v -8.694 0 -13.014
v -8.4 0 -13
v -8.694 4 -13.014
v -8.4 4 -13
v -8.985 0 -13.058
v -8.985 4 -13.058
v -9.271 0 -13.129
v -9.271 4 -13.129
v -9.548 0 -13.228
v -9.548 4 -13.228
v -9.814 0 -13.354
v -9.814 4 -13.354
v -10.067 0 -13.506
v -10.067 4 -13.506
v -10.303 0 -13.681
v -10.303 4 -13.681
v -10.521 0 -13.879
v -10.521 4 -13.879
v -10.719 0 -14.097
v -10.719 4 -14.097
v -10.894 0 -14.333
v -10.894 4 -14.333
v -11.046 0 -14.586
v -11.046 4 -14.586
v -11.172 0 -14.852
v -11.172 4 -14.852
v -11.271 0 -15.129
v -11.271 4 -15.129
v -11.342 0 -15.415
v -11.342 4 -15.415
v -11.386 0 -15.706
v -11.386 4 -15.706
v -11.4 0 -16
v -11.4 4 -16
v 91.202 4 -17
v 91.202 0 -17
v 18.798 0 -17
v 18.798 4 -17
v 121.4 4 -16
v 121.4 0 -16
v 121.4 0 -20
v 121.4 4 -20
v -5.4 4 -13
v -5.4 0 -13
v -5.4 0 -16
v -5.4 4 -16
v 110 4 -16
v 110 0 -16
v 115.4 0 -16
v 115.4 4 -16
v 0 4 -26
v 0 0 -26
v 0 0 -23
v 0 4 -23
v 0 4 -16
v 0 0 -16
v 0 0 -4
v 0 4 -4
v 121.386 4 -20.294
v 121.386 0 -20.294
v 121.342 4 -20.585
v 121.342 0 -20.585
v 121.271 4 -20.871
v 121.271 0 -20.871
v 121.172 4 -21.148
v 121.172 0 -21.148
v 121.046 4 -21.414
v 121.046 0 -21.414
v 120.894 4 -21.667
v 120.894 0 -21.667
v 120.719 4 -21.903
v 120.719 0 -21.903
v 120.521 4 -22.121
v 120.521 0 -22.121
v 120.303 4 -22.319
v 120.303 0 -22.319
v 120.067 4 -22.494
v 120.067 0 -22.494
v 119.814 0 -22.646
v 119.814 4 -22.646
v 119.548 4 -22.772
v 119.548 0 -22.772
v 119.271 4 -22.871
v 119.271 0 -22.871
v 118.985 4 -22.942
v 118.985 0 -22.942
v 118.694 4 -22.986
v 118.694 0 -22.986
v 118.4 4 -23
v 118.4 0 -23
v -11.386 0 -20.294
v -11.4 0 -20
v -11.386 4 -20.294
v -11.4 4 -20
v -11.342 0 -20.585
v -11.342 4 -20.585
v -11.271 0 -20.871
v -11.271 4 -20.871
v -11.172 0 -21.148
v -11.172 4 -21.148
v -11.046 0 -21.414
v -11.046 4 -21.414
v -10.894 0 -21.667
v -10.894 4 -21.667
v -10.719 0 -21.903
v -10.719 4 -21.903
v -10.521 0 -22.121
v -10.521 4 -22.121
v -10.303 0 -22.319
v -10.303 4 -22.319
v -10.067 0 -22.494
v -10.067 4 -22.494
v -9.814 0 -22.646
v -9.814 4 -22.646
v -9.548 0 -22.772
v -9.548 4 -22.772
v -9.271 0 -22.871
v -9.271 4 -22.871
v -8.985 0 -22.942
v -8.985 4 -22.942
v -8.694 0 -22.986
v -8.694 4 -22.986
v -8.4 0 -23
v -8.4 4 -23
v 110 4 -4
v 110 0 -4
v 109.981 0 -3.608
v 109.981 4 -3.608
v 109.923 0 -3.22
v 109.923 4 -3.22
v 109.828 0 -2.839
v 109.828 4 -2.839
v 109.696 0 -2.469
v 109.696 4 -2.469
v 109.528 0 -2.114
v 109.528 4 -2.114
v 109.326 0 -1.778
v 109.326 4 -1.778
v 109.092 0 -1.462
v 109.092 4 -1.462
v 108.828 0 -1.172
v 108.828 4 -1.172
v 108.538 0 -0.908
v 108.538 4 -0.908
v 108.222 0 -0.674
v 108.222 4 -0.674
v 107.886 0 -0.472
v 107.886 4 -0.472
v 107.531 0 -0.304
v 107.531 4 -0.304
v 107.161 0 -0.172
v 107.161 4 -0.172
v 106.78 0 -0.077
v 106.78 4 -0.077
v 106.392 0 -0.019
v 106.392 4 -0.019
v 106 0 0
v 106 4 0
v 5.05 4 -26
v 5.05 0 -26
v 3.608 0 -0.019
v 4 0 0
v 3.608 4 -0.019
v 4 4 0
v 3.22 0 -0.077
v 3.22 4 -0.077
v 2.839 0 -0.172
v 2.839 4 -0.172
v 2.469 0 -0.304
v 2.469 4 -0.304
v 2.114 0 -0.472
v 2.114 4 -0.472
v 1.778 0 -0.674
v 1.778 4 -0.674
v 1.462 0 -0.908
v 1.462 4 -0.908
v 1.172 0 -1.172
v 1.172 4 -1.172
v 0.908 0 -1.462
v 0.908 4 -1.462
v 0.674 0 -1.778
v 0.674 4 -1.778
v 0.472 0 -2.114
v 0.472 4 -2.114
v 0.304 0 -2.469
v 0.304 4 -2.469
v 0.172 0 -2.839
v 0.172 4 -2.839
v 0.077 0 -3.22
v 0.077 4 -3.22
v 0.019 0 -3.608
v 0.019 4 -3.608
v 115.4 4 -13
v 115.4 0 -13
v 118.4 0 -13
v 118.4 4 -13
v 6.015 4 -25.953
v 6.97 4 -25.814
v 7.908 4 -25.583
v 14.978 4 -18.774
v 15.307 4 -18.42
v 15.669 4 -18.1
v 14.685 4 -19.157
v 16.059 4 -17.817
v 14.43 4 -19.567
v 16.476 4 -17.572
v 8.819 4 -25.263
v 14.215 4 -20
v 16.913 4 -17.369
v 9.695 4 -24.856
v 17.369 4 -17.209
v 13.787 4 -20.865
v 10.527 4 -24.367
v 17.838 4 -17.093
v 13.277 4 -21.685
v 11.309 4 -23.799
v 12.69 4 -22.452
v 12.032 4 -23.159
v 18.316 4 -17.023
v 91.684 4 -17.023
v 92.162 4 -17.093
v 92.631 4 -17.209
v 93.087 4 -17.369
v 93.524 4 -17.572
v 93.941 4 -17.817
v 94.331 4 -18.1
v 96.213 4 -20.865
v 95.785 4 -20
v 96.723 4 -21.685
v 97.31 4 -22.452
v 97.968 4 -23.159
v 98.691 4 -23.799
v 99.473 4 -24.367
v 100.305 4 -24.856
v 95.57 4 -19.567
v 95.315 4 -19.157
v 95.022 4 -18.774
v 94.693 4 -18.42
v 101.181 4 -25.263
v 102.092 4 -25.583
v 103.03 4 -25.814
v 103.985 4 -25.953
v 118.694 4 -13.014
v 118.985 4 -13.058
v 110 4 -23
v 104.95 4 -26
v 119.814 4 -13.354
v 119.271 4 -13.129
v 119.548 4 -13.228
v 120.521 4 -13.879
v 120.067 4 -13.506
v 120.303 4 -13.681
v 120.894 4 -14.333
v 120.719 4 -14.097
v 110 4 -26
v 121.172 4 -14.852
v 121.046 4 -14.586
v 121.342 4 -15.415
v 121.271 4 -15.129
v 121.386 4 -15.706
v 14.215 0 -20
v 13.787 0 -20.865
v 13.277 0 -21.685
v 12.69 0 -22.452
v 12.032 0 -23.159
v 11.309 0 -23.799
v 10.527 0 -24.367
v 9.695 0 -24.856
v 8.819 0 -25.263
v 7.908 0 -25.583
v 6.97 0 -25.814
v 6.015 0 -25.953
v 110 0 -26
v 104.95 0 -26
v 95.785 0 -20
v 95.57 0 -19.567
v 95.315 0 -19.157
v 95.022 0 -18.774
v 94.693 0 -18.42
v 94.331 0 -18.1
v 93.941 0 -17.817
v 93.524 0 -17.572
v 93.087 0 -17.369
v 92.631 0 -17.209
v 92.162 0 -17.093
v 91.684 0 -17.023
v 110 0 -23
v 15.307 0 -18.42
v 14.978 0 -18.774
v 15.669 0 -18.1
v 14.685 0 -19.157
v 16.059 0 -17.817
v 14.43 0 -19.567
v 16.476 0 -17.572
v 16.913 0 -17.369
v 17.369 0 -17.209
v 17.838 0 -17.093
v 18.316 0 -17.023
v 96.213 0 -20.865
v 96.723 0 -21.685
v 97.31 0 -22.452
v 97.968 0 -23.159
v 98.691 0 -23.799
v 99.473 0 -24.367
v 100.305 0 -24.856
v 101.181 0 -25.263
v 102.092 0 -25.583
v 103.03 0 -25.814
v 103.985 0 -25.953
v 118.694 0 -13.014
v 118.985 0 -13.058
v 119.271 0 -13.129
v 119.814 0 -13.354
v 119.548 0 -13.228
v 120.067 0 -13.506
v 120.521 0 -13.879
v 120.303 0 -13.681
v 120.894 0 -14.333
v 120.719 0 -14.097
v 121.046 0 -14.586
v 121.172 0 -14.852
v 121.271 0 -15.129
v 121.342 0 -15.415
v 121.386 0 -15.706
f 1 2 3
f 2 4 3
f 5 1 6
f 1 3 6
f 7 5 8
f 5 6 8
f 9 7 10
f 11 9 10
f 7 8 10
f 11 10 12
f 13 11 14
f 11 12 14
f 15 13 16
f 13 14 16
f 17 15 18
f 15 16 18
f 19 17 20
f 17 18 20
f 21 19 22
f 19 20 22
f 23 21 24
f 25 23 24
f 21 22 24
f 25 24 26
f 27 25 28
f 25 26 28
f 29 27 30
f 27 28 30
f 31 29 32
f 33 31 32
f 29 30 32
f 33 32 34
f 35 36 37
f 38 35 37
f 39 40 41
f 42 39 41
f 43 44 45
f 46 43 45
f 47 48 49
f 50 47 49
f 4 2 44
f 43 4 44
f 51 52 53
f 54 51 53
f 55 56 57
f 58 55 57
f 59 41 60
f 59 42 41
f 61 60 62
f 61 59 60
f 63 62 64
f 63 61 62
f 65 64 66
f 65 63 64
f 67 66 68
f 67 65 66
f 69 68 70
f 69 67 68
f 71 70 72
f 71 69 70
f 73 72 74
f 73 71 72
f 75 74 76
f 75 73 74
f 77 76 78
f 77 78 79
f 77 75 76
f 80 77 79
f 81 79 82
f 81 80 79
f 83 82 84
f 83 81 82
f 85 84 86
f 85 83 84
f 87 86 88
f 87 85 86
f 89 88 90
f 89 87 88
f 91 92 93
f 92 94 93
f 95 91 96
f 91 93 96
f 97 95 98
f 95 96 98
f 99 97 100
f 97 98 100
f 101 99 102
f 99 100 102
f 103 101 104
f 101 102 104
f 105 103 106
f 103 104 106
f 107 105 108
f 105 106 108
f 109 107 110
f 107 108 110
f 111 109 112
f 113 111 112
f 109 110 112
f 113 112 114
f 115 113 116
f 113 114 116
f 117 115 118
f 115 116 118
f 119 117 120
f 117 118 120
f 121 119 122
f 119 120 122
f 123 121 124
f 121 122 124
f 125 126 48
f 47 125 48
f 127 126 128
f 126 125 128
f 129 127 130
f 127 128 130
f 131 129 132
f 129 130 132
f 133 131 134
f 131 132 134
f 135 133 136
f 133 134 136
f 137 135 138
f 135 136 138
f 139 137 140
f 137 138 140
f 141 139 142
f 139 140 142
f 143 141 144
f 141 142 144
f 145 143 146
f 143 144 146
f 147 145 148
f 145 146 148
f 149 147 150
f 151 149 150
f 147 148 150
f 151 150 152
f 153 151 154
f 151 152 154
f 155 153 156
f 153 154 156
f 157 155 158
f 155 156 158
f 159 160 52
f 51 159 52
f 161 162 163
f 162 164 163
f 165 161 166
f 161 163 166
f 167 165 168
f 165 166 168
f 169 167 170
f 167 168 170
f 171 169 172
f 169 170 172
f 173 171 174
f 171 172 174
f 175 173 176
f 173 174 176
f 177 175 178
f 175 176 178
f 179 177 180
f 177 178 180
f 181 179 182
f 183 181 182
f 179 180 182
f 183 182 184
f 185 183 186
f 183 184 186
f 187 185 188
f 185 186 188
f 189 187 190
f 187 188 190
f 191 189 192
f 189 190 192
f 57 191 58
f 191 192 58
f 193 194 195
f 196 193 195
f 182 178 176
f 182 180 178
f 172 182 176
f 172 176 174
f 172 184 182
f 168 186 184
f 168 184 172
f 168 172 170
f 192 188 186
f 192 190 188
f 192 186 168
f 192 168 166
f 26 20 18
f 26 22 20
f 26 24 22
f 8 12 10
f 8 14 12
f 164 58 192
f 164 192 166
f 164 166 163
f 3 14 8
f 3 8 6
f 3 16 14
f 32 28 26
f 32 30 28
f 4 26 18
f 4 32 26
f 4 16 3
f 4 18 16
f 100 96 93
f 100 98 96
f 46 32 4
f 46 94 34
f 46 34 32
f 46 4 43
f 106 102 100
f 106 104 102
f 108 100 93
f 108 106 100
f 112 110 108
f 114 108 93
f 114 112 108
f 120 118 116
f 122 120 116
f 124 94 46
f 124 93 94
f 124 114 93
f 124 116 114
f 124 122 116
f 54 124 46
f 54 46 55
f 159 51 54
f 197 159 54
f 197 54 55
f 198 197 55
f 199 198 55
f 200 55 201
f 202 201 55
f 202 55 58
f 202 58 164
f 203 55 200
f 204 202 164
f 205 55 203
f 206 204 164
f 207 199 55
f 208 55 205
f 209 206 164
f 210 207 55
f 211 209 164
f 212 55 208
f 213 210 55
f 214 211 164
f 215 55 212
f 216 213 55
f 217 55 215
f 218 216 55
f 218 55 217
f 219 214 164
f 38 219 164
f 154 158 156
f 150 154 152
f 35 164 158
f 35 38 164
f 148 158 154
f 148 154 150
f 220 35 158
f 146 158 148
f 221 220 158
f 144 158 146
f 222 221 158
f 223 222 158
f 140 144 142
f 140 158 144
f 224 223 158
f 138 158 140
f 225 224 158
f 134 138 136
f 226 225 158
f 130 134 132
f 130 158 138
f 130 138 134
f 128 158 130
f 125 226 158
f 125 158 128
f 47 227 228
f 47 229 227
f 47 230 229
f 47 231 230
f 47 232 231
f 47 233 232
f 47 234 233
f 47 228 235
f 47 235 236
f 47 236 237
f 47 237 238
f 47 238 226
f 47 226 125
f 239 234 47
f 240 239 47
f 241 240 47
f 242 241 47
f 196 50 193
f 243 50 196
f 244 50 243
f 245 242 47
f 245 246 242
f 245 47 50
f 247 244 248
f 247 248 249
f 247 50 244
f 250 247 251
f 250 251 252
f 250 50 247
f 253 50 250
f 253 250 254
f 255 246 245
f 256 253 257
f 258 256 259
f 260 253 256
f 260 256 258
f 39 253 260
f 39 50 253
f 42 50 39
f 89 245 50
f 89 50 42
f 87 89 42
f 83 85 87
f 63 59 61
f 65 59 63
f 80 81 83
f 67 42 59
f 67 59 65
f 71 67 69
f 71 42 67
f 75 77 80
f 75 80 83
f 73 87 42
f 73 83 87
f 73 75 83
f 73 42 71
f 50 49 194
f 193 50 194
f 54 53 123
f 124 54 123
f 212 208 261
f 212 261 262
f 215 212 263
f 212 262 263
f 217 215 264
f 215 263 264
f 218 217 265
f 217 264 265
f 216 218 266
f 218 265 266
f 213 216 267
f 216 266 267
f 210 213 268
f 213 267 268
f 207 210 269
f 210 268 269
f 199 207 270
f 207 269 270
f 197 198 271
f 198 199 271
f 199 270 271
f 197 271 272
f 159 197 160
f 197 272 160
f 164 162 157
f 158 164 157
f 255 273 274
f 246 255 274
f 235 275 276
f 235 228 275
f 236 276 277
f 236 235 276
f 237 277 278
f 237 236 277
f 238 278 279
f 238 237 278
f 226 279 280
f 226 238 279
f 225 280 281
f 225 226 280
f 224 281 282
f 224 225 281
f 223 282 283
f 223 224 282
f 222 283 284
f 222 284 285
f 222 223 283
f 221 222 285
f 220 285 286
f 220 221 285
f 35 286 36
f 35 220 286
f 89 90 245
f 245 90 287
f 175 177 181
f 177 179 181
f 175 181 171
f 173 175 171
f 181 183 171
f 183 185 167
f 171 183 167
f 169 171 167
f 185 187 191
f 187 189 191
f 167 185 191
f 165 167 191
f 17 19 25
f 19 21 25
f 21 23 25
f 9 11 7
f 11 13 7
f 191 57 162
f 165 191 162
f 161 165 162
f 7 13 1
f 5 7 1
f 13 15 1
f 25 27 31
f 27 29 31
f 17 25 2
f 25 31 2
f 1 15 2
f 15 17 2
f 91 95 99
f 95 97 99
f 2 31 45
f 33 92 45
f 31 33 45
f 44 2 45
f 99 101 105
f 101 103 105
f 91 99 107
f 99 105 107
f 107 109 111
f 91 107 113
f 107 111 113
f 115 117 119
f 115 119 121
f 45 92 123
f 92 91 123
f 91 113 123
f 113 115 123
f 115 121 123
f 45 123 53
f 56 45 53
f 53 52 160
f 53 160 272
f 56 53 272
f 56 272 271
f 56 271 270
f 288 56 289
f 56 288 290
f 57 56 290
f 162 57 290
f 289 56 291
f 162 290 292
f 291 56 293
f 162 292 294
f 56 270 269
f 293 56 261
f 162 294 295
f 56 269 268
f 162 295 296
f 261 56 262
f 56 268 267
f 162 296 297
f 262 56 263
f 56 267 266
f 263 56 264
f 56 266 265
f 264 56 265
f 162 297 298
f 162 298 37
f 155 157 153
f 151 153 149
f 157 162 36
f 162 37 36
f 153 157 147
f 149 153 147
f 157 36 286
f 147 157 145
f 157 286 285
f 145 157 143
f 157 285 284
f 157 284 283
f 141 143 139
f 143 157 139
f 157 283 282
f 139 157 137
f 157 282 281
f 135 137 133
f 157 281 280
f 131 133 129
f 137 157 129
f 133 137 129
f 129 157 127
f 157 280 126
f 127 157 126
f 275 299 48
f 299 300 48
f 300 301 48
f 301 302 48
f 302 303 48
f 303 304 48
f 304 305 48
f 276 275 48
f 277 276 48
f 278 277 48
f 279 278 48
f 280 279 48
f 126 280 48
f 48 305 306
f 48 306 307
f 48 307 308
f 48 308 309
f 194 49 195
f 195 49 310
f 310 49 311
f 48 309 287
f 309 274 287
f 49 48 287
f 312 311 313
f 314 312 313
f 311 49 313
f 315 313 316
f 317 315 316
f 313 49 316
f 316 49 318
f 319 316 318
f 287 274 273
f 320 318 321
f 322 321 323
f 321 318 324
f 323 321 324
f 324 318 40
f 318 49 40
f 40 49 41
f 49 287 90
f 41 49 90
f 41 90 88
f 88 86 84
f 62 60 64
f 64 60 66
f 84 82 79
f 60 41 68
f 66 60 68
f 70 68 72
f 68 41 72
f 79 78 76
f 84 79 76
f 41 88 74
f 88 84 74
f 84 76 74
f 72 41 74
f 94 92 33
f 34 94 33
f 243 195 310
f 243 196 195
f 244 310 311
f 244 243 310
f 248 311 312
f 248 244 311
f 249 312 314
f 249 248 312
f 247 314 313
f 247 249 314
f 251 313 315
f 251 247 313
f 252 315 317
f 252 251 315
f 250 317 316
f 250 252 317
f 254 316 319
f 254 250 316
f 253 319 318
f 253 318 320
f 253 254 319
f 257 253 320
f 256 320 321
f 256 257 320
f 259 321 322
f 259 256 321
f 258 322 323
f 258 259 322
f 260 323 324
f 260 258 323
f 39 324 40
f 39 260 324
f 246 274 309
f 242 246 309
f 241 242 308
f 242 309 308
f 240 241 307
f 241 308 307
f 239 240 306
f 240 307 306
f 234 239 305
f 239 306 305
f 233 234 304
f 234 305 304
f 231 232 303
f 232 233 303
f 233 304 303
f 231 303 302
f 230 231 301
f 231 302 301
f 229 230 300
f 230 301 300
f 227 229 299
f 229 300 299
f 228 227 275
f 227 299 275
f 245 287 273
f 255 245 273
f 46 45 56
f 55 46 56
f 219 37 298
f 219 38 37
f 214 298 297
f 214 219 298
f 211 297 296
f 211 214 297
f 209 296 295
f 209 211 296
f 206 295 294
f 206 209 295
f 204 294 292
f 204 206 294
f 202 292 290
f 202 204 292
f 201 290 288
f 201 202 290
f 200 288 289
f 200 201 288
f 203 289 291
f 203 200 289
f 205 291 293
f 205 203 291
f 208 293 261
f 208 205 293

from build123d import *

# Parameters (mm, degrees)
ESTRUSIONE_ESTRUSIONE1_DEPTH = 4
RACCORDO1_R                  = 10
RACCORDO2_R                  = 4
RACCORDO9_R                  = 3
RACCORDO10_R                 = 3
RACCORDO11_R                 = 5


with BuildPart() as part:
    # Schizzo1 → Estrusione-Estrusione1 (new body)
    with BuildSketch(Plane(origin=(0, 0, 0), x_dir=(1, 0, 0), z_dir=(0, 1, 0))):
        Polygon((-11.4, 23), (-11.4, 13), (-5.4, 13), (-5.4, 16), (0, 16), (0, 0), (110, 0), (110, 16), (115.4, 16), (115.4, 13), (121.4, 13), (121.4, 23), (110, 23), (110, 26), (95, 26), (95, 17), (15, 17), (15, 26), (0, 26), (0, 23), align=None)
    extrude(amount=ESTRUSIONE_ESTRUSIONE1_DEPTH)

    # Raccordo1
    # the kernel refuses this fillet: 10 mm, written as the material it takes off along each edge
    with BuildSketch(Plane(origin=(95, -24.874685928, -26), x_dir=(1, 0, 0), z_dir=(0, 1, 0))) as raccordo1_piece_1:
        with BuildLine():
            CenterArc((9.949874371, -10), RACCORDO1_R, 90, 84.260829523)
            Line((0, -9), (-0.198997487, -8.98))
            ThreePointArc((-0.198997487, -8.98), (-0.2, -4.5), (-0.2, 0))
            Line((-0.2, 0), (0, 0.2))
            Line((0, 0.2), (9.949874371, 0.2))
            Line((9.949874371, 0.2), (9.949874371, 0))
        make_face()
    extrude(amount=53.749371855, mode=Mode.SUBTRACT)
    with BuildSketch(Plane(origin=(15, -24.874685928, -26), x_dir=(0, 0, 1), z_dir=(0, 1, 0))) as raccordo1_piece_2:
        with BuildLine():
            CenterArc((10, -9.949874371), RACCORDO1_R, 95.739170477, 84.260829523)
            Line((0, -9.949874371), (-0.2, -9.949874371))
            Line((-0.2, -9.949874371), (-0.2, 0))
            Line((-0.2, 0), (0, 0.2))
            ThreePointArc((0, 0.2), (4.5, 0.2), (8.98, 0.198997487))
            Line((8.98, 0.198997487), (9, 0))
        make_face()
    extrude(amount=53.749371855, mode=Mode.SUBTRACT)

    # Raccordo2
    raccordo2_edges = [part.edges().sort_by_distance(p)[0] for p in [
        (110, 2, 0),
        (0, 2, 0),
    ]]
    fillet(raccordo2_edges, radius=RACCORDO2_R)

    # Raccordo9
    raccordo9_edges = [part.edges().sort_by_distance(p)[0] for p in [
        (-11.4, 2, -13),
        (-11.4, 2, -23),
    ]]
    fillet(raccordo9_edges, radius=RACCORDO9_R)

    # Raccordo10
    raccordo10_edges = [part.edges().sort_by_distance(p)[0] for p in [
        (121.4, 2, -23),
        (121.4, 2, -13),
    ]]
    fillet(raccordo10_edges, radius=RACCORDO10_R)

    # Raccordo11
    raccordo11_edges = [part.edges().sort_by_distance(p)[0] for p in [
        (15, 2, -17),
        (95, 2, -17),
    ]]
    fillet(raccordo11_edges, radius=RACCORDO11_R)


solid = part.part
